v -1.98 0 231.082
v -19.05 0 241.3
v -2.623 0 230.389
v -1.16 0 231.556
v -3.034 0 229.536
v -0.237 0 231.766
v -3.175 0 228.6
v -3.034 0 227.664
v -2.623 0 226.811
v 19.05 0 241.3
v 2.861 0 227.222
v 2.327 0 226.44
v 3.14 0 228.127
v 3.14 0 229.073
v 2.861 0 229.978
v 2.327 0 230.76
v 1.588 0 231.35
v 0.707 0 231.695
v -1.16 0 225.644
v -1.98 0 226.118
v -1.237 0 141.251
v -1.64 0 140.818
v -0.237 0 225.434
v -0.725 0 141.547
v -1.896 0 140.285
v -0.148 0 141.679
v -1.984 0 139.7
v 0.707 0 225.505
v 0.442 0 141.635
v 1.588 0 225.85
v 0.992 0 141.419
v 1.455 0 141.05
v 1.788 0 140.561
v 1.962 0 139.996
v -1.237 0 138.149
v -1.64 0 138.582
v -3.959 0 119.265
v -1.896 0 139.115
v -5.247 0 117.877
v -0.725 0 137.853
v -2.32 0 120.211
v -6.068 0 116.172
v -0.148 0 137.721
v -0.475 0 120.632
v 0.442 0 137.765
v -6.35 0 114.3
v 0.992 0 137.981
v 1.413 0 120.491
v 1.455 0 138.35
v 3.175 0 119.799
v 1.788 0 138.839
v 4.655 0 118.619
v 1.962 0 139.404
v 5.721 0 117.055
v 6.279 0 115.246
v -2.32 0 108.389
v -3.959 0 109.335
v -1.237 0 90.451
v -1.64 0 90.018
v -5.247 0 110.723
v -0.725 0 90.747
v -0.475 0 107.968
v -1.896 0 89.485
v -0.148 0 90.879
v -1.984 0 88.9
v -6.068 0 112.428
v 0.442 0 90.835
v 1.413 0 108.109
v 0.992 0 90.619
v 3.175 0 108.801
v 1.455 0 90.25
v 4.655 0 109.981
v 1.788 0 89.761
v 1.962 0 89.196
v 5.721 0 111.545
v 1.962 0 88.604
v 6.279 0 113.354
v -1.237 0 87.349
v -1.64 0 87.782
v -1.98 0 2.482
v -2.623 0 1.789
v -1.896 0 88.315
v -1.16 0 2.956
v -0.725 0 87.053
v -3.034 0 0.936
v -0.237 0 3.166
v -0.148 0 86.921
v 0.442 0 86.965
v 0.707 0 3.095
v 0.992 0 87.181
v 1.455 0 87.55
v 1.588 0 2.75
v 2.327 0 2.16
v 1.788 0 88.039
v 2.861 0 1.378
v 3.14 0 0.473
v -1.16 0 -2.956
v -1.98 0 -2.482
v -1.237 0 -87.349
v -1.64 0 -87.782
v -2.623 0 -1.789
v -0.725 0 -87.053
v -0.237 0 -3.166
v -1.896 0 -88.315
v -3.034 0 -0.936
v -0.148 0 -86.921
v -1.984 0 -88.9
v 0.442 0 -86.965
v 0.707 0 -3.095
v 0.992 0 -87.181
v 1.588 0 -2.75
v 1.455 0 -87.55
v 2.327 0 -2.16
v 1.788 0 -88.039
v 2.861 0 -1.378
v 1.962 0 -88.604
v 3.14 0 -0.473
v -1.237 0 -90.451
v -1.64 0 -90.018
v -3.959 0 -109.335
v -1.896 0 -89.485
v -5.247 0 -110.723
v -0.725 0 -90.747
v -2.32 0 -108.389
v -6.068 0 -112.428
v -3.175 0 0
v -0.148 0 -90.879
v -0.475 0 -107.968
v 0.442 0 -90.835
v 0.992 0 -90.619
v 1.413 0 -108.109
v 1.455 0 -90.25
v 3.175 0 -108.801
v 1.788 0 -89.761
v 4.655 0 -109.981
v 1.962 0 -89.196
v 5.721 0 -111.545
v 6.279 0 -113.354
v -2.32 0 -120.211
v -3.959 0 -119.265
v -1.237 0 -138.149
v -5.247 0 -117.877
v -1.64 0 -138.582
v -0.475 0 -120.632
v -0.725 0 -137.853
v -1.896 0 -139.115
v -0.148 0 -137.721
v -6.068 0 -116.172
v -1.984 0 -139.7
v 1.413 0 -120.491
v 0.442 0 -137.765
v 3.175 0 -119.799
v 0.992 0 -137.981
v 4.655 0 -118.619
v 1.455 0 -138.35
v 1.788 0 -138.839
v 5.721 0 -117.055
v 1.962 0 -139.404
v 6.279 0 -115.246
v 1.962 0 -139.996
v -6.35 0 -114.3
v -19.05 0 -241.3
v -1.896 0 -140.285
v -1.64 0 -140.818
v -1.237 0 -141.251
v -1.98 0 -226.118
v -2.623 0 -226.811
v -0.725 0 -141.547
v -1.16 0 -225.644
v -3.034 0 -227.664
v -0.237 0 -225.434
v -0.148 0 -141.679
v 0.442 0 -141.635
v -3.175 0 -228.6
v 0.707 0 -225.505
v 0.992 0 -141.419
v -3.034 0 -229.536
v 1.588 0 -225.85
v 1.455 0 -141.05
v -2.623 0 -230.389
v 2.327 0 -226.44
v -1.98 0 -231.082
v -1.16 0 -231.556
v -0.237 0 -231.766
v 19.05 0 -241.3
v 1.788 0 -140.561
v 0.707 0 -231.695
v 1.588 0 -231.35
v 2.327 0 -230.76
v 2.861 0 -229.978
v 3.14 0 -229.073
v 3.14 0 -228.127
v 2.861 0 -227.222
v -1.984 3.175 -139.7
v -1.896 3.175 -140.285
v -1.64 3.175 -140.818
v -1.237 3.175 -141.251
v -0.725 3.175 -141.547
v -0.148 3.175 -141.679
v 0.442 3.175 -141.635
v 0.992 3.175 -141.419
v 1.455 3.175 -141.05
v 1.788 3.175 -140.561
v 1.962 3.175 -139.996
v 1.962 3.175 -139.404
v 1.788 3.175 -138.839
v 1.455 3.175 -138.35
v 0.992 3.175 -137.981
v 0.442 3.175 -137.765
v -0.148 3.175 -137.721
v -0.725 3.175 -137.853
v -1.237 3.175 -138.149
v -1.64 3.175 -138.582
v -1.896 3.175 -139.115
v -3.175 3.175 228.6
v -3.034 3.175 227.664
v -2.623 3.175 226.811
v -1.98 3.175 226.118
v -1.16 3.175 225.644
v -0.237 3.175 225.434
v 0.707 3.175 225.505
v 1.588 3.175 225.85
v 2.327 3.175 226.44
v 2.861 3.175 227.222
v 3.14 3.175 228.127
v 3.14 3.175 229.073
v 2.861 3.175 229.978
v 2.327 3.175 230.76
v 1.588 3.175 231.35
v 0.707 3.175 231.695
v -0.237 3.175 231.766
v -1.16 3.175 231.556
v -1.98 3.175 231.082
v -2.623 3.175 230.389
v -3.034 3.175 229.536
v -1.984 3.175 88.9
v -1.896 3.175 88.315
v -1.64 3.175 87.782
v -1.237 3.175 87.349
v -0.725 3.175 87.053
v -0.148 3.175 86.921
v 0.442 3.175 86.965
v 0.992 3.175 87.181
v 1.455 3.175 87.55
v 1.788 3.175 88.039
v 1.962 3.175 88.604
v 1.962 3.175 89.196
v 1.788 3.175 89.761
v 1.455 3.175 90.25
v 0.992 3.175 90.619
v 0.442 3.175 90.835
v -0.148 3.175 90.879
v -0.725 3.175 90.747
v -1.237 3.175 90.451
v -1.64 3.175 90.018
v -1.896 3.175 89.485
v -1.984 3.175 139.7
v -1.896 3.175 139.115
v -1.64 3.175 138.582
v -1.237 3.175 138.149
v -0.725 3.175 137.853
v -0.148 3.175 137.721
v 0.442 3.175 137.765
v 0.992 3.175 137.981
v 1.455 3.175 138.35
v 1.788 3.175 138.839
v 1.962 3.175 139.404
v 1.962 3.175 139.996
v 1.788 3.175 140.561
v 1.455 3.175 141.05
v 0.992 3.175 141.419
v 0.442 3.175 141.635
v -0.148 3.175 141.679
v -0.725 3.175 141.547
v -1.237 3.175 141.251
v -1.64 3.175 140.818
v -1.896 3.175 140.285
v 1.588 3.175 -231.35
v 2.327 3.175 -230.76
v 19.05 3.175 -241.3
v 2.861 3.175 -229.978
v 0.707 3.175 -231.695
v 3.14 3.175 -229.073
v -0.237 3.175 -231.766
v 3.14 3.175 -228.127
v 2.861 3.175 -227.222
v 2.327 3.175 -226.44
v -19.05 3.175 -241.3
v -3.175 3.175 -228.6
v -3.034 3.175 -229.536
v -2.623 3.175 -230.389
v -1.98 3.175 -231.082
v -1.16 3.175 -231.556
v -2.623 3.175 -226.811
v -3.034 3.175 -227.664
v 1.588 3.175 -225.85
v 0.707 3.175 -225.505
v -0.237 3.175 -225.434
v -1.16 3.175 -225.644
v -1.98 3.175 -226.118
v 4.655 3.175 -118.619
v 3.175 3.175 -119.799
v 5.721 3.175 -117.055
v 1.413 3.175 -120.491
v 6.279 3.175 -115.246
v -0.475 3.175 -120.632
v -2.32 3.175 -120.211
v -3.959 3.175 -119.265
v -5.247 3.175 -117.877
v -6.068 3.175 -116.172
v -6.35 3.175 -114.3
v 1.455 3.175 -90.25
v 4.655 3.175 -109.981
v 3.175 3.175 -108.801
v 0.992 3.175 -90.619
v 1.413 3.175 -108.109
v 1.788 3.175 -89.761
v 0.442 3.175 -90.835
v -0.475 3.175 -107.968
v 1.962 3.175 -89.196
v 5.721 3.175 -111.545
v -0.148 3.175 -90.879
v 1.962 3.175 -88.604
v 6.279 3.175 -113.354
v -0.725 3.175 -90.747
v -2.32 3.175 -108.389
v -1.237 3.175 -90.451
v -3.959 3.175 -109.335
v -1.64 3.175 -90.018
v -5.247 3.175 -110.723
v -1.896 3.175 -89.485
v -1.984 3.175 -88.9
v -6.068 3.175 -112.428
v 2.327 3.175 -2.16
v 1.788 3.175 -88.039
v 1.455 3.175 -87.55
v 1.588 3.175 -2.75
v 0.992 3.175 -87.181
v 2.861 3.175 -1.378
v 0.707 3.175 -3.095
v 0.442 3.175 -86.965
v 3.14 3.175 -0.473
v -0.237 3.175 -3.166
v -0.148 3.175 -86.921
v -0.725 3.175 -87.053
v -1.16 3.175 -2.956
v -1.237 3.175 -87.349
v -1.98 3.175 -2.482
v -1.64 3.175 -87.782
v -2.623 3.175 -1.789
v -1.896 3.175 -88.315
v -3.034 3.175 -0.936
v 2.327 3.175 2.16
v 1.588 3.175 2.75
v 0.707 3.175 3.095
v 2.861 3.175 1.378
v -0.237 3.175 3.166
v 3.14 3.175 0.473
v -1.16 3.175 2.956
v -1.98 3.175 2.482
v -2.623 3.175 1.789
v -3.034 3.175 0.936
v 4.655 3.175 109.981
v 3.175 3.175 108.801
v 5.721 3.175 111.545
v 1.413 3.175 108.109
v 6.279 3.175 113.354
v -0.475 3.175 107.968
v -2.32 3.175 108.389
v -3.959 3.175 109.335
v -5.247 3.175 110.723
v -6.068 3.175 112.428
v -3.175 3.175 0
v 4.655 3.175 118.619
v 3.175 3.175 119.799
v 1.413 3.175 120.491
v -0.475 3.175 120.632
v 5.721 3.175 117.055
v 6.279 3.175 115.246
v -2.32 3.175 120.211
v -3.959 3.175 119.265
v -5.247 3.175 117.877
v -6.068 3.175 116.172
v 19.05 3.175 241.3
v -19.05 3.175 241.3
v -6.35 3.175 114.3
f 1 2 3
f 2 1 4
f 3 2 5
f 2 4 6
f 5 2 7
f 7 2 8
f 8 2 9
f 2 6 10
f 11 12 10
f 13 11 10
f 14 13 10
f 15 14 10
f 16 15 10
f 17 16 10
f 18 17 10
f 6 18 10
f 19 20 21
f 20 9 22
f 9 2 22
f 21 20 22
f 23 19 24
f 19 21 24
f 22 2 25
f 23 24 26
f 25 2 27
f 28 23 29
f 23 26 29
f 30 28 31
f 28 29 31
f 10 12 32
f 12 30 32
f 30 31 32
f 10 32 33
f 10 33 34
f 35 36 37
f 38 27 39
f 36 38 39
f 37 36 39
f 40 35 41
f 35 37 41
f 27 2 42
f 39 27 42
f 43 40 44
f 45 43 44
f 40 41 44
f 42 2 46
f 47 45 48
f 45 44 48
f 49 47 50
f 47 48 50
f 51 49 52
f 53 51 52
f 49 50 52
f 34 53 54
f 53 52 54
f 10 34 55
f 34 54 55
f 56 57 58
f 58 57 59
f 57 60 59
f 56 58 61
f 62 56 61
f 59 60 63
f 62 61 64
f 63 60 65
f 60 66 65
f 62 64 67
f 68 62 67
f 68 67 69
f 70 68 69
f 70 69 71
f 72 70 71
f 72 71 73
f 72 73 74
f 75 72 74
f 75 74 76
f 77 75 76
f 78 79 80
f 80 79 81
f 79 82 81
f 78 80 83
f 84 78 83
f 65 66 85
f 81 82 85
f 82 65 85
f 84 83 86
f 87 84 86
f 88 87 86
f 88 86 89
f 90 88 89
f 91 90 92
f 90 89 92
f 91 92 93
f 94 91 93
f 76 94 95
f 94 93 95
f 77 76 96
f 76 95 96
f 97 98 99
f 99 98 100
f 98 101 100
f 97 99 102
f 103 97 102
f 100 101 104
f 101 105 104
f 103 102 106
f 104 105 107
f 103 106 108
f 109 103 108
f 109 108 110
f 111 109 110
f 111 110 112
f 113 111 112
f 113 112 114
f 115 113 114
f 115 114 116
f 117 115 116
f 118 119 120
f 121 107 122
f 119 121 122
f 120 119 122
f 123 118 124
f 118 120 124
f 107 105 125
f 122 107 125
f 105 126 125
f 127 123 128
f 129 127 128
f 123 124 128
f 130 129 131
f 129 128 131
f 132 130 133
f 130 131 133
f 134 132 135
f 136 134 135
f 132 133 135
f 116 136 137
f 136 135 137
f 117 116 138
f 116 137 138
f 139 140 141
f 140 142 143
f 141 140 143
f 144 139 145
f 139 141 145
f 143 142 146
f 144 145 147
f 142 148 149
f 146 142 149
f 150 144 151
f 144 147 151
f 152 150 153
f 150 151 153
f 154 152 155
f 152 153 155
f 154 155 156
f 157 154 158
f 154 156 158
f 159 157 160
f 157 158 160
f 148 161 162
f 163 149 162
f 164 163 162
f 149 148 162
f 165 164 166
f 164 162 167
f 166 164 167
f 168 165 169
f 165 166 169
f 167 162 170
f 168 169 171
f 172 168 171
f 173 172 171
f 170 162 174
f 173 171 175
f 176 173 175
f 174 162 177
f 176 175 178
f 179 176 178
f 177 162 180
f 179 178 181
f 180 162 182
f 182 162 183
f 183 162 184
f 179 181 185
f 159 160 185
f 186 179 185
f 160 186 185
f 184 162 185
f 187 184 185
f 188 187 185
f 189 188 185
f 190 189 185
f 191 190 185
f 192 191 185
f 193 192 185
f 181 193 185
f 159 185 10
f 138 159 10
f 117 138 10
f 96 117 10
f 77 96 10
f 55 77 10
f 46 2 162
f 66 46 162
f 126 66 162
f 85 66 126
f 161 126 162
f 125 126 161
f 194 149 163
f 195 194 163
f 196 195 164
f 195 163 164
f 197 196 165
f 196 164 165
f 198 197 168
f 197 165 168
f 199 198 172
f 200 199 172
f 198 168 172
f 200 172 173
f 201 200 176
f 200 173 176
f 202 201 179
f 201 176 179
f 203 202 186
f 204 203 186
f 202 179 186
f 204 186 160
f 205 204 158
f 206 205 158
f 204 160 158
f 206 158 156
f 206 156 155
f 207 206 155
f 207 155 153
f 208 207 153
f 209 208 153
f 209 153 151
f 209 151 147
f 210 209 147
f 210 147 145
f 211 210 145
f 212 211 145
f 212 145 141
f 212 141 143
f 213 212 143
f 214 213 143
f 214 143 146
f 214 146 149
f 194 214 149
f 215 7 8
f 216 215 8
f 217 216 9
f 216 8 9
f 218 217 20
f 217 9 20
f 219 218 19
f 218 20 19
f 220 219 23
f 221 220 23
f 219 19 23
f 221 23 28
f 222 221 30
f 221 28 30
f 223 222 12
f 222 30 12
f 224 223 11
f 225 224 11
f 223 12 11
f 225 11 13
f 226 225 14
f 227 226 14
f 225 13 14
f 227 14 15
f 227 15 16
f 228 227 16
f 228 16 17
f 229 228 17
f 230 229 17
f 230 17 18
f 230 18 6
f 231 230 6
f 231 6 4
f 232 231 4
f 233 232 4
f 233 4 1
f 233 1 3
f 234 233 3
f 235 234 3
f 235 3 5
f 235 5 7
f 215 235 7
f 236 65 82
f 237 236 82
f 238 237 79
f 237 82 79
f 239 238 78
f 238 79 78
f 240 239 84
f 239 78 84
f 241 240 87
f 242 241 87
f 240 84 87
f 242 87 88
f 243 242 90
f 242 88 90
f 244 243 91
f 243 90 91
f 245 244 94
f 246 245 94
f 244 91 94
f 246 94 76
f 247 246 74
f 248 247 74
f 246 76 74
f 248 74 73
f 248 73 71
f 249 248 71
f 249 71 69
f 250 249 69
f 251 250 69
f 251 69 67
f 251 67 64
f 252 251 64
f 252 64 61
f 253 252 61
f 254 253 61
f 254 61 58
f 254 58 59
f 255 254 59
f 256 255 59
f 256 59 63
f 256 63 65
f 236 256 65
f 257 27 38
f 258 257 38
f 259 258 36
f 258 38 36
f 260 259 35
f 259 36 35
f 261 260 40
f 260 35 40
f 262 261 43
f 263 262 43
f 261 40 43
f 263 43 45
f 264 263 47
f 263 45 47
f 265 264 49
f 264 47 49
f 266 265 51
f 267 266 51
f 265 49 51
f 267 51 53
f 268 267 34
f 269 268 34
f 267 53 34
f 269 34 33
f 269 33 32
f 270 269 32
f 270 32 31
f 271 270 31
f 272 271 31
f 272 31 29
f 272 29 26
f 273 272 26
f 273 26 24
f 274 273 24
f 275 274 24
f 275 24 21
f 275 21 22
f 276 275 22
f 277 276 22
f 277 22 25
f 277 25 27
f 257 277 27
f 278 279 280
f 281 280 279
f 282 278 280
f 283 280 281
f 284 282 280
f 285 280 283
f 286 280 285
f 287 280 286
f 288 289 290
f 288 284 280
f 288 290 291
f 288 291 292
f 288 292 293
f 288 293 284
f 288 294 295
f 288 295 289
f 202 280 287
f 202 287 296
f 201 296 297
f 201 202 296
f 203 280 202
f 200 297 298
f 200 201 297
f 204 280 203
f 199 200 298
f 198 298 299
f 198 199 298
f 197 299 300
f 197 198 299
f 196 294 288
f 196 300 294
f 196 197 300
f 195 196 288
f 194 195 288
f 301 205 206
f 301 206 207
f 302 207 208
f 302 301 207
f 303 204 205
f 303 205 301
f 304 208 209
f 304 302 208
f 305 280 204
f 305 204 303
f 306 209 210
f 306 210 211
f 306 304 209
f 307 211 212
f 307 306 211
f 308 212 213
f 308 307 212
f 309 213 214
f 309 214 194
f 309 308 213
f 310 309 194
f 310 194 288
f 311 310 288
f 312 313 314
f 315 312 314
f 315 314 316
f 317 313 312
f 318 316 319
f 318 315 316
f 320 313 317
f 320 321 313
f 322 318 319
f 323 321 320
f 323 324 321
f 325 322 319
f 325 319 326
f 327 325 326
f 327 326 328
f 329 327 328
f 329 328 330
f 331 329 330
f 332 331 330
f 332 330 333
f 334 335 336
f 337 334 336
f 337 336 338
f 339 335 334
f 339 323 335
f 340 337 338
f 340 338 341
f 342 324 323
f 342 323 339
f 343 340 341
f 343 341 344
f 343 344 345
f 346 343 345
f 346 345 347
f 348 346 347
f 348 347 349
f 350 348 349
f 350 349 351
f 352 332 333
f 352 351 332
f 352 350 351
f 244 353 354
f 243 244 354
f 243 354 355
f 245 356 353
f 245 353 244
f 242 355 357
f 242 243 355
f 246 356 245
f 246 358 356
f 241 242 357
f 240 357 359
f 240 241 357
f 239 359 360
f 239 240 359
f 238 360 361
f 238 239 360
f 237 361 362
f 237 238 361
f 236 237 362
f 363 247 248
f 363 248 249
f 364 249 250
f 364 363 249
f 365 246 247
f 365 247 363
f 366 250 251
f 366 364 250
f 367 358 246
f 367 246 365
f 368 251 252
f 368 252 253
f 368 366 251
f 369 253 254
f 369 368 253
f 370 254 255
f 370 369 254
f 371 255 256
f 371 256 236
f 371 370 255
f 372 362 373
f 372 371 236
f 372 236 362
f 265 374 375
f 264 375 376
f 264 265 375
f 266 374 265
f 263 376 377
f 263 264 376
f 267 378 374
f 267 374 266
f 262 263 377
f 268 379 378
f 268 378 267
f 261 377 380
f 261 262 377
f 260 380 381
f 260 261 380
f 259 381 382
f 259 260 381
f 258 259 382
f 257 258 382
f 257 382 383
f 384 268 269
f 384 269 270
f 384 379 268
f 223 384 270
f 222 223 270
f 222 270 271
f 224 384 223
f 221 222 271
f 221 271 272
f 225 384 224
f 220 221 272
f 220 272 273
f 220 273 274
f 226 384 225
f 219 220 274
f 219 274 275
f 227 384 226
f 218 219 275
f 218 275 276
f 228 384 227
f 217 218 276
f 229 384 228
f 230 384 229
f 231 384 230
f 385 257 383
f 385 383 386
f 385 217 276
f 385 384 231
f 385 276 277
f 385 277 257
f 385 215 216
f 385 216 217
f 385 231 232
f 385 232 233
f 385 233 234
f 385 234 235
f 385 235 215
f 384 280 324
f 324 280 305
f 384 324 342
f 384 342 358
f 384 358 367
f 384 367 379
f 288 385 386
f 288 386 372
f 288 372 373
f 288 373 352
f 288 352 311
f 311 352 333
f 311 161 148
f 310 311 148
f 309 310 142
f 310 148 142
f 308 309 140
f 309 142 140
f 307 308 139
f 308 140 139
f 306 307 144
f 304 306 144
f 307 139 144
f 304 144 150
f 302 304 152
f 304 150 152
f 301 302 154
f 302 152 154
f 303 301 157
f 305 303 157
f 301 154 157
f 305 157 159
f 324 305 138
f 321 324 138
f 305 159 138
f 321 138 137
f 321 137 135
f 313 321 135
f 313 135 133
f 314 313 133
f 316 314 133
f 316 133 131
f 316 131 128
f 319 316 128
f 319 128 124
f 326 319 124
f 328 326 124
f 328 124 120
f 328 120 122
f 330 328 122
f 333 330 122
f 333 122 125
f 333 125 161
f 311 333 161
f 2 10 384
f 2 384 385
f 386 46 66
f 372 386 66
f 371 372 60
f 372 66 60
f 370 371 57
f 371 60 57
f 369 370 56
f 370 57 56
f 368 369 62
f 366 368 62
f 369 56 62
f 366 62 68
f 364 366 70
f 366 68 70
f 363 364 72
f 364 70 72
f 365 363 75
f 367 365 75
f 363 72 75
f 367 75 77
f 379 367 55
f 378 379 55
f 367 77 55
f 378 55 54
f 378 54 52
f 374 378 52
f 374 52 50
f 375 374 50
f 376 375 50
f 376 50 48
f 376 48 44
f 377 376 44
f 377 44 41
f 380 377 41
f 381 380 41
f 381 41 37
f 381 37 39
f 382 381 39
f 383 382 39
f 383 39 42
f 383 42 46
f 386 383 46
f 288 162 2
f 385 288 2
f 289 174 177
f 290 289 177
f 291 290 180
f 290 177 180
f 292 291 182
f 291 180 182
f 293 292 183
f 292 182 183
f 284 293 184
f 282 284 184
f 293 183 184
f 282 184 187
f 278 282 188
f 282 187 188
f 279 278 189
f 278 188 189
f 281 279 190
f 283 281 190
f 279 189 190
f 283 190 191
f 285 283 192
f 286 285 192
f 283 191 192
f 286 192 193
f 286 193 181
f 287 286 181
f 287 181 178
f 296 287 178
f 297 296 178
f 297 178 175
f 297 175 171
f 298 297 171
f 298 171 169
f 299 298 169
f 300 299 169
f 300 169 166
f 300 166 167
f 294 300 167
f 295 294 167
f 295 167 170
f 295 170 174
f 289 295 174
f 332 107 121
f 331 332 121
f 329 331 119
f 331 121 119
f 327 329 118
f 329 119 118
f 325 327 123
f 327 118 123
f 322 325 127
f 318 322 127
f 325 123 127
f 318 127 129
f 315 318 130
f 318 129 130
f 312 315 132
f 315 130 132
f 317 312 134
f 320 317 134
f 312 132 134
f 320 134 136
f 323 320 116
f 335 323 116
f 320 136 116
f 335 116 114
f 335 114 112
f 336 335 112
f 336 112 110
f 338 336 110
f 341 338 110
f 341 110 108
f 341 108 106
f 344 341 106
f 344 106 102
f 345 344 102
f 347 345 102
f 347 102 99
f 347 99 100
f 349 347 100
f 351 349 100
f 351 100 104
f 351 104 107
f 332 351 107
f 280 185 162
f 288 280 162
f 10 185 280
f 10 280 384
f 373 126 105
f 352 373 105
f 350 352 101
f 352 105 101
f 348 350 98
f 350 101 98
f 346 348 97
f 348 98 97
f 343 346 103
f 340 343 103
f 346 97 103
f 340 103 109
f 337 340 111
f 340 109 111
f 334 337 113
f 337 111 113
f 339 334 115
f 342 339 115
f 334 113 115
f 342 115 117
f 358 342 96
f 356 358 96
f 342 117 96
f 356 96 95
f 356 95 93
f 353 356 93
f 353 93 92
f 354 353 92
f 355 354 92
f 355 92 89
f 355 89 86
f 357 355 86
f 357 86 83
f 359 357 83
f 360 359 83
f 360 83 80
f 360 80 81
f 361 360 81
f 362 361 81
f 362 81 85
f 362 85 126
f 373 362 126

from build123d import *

# Parameters (mm, degrees)
SKETCH1_W        = 38.1
SKETCH1_H        = 482.6
EXTRUSION1_DEPTH = 3.175
HOLE1_D          = 6.35
HOLE2_D          = 12.7
EXTRUSION2_START = -3.175
SKETCH6_R        = 6.35
EXTRUSION2_DEPTH = 3.175
HOLE3_D          = 12.7
HOLE4_D          = 3.96875


with BuildPart() as part:
    # Sketch1 → Extrusion1 (new body)
    with BuildSketch(Plane(origin=(0, 0, 0), x_dir=(-1, 0, 0), z_dir=(0, 1, 0))):
        Rectangle(SKETCH1_W, SKETCH1_H)
    extrude(amount=EXTRUSION1_DEPTH)

    # Hole1 (through all)
    with Locations(Plane(origin=(0, 3.175, 0), x_dir=(1, 0, 0), z_dir=(0, 1, 0))):
        with Locations((0, -228.6), (0, 228.6), (0, 0)):
            Hole(HOLE1_D / 2)

    # Hole2 (through all)
    with Locations(Plane(origin=(0, 3.175, 0), x_dir=(1, 0, 0), z_dir=(0, 1, 0))):
        with Locations((0, -101.6), (0, 101.6)):
            Hole(HOLE2_D / 2)

    # Sketch6 → Extrusion2 (add)
    with BuildSketch(Plane(origin=(0, 3.175, 0), x_dir=(1, 0, 0), z_dir=(0, 1, 0)).offset(EXTRUSION2_START)):
        with Locations((0, -101.6)):
            Circle(SKETCH6_R)
        with Locations((0, 101.6)):
            Circle(SKETCH6_R)
    extrude(amount=EXTRUSION2_DEPTH)

    # Hole3 (through all)
    with Locations(Plane(origin=(0, 3.175, 0), x_dir=(1, 0, 0), z_dir=(0, 1, 0))):
        with Locations((0, 114.3), (0, -114.3)):
            Hole(HOLE3_D / 2)

    # Hole4 (through all)
    with Locations(Plane(origin=(0, 3.175, 0), x_dir=(1, 0, 0), z_dir=(0, 1, 0))):
        with Locations((0, -88.9), (0, -139.7), (0, 88.9), (0, 139.7)):
            Hole(HOLE4_D / 2)


solid = part.part
